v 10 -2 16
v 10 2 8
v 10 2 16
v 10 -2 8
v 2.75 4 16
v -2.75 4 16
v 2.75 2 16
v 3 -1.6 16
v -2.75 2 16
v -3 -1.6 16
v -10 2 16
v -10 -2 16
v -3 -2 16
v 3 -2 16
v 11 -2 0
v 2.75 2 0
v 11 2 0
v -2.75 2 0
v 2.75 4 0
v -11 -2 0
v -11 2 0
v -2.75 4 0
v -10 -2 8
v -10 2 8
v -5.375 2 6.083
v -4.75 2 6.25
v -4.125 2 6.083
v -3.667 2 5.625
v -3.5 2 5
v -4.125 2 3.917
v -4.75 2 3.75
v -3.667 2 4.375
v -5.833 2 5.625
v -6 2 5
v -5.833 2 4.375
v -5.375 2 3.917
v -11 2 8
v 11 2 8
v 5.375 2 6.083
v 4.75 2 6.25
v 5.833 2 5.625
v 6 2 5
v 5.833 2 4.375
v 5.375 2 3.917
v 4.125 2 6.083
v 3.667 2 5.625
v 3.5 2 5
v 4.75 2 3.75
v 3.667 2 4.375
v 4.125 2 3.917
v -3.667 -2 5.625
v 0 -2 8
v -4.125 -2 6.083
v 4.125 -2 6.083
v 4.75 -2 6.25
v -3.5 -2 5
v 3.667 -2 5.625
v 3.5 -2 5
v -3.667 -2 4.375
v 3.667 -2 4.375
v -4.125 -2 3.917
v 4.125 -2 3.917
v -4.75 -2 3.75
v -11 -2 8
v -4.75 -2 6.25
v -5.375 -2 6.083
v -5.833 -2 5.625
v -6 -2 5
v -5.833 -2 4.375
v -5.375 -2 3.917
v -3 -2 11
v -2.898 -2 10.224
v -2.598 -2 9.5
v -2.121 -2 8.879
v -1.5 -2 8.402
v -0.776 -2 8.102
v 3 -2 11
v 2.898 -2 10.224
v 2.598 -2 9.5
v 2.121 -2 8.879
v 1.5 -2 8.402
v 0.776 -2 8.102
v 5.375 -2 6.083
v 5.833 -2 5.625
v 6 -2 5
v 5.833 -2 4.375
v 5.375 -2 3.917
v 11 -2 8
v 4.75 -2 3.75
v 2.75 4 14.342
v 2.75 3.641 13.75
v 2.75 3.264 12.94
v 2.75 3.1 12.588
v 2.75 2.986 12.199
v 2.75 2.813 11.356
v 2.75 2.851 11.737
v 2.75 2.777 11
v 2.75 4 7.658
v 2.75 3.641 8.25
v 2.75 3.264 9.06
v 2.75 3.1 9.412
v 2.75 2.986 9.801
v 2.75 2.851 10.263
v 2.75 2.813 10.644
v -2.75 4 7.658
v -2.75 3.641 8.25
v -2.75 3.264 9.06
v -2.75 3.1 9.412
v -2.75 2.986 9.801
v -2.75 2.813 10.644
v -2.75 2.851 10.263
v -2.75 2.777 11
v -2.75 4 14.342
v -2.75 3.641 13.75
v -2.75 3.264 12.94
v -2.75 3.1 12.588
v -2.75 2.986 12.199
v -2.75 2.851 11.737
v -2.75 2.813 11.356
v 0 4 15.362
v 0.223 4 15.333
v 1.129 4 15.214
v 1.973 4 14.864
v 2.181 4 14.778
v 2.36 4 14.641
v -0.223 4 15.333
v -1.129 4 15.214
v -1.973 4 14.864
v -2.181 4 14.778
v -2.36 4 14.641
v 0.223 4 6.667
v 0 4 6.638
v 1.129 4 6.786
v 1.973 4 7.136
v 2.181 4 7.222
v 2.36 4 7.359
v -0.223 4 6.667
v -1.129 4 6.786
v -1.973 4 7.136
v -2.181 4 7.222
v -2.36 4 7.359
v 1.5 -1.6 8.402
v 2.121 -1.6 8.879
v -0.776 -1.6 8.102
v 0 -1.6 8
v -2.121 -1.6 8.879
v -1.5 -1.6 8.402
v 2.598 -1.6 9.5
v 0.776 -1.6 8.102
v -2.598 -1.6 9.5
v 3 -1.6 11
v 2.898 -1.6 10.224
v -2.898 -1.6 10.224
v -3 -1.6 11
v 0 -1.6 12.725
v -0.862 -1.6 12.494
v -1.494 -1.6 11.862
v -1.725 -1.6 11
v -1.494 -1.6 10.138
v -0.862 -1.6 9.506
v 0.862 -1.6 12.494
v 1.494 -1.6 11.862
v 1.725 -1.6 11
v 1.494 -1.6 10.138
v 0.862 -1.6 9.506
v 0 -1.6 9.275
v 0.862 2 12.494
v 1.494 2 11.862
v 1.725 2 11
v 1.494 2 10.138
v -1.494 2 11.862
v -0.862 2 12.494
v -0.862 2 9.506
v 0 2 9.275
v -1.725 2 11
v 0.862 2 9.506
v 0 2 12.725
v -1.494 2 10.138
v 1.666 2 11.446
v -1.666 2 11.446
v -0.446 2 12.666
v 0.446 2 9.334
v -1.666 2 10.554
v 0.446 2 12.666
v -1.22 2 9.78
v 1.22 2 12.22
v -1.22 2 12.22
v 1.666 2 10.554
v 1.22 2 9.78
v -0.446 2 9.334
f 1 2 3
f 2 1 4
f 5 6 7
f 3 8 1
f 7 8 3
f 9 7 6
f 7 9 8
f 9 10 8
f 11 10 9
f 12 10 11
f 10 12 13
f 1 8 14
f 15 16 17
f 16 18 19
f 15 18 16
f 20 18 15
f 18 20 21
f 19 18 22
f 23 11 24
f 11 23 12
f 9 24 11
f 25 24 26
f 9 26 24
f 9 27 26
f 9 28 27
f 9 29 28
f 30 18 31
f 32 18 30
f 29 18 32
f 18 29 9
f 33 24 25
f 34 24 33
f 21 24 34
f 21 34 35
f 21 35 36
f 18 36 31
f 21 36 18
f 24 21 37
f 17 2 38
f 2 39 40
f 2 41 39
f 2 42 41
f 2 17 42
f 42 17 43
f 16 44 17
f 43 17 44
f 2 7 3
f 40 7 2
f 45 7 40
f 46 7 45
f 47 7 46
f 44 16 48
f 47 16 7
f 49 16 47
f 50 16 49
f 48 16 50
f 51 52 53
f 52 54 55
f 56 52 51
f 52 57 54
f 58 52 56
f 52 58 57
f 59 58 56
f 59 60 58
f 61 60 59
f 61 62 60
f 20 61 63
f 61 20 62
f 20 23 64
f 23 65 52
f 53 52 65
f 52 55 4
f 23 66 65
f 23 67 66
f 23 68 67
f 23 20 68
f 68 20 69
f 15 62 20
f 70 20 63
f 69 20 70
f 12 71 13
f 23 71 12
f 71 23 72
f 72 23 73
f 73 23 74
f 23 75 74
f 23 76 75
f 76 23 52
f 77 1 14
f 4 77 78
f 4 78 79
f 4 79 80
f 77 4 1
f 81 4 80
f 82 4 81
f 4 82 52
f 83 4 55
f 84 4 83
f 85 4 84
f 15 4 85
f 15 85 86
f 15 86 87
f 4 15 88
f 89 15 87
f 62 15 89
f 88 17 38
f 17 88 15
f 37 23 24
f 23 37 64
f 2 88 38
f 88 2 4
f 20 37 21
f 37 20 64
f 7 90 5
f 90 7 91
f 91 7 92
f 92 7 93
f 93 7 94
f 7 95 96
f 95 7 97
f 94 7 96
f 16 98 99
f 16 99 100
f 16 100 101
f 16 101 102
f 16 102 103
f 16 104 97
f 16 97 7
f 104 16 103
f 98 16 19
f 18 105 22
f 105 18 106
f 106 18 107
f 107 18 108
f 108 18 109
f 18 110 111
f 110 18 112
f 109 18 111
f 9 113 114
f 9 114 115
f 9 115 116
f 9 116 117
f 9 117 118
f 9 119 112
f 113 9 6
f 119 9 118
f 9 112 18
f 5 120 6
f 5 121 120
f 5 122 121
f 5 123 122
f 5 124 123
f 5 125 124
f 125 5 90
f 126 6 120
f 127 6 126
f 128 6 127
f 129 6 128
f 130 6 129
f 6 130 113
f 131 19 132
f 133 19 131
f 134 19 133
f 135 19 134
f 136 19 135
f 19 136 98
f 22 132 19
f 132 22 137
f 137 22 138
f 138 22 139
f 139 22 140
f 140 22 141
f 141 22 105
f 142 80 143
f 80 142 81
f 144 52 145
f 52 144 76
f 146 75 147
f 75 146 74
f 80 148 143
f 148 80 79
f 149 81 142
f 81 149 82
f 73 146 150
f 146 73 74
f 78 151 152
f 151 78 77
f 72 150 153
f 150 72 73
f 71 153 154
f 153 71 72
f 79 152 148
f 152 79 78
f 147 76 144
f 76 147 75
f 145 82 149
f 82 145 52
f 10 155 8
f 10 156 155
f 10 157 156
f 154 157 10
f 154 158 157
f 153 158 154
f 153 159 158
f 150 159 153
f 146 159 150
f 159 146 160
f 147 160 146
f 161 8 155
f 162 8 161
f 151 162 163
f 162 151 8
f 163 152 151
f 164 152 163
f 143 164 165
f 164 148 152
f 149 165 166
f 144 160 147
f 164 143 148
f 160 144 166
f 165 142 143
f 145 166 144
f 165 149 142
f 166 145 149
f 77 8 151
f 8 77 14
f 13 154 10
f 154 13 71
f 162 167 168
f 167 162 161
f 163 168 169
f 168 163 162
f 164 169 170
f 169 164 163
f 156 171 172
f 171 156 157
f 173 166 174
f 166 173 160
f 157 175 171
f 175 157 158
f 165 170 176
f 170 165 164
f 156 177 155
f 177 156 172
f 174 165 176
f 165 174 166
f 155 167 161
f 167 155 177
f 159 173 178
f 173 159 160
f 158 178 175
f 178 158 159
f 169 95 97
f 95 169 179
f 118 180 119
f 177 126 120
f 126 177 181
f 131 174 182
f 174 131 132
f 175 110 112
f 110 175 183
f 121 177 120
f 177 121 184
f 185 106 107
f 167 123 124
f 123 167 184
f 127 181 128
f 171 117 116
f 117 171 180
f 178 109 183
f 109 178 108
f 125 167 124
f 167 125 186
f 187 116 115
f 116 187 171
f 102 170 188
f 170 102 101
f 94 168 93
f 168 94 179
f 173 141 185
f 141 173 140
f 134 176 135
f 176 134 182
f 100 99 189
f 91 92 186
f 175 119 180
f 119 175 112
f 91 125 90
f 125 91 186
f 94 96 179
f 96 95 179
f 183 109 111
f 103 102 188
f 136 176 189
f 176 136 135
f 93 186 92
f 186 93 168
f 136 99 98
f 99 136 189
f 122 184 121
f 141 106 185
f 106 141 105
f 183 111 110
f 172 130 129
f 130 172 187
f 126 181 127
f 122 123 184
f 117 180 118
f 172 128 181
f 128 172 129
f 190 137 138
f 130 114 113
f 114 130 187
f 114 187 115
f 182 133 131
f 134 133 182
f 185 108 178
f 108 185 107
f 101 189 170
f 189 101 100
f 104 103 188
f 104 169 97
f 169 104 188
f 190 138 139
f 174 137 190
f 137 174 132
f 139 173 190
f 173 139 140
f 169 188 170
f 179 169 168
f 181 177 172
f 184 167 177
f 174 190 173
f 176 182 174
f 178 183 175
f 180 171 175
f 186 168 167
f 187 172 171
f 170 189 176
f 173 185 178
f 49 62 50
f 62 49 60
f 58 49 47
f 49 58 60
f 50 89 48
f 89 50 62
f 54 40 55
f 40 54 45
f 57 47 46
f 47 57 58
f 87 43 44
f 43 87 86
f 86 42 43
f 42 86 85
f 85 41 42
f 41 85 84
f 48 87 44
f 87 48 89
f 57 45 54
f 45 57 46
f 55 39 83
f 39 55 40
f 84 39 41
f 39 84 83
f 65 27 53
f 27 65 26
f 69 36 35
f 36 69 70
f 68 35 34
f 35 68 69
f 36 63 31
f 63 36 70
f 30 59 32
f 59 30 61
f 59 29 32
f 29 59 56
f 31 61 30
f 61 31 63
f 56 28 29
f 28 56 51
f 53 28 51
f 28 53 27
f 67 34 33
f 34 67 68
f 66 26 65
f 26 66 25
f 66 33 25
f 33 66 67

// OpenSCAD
// file: microswitch.scad
// Don't print this file, purchase real micro switches
// e.g. Honeywell ZM10B10A01 or OMRON SS-5 or similar.

module microswitch() {
  difference() {
    union() {
      translate([0, 0, 2.5])
        cube([19.8, 6, 10], center=true);
      translate([2.5, 0.5, 6])
        cube([2, 3.5, 5], center=true);
      for (x = [-8, -1, 8]) {
        translate([x, 0, 0])
          cube([0.6, 3.2, 13], center=true);
      }
    }
    for (x = [-9.5/2, 9.5/2]) {
      translate([x, 0, 0]) rotate([90, 0, 0])
        cylinder(r=2.5/2, h=20, center=true, $fn=12);
    }
  }
}

microswitch();
// file: configuration.scad
// Increase this if your slicer or printer make holes too tight.
extra_radius = 0.1;

// OD = outside diameter, corner to corner.
m3_nut_od = 6.1;
m3_nut_radius = m3_nut_od/2 + 0.2 + extra_radius;
m3_washer_radius = 3.5 + extra_radius;


// OD = outside diameter, corner to corner.
m3_nut_od = 6.1;
m3_nut_radius = m3_nut_od/2 + 0.2 + extra_radius;
m3_washer_radius = 3.5 + extra_radius;


// Major diameter of metric 3mm thread.
m3_major = 2.85;
m3_radius = m3_major/2 + extra_radius;
m3_wide_radius = m3_major/2 + extra_radius + 0.2;

// NEMA17 stepper motors.
motor_shaft_diameter = 5;
motor_shaft_radius = motor_shaft_diameter/2 + extra_radius;

// Frame brackets. M3x8mm screws work best with 3.6 mm brackets.
thickness = 3.6;

// OpenBeam or Misumi. Currently only 15x15 mm, but there is a plan
// to make models more parametric and allow 20x20 mm in the future.
extrusion = 15;

// Placement for the NEMA17 stepper motors.
motor_offset = 44;
motor_length = 47;
// main file
include <configuration.scad>;

use <microswitch.scad>;

thickness = 4;  //  thicker than v-roller linear .
width = 20;  // Same as vertical extrusion.change  for 2020
height = 16;

module endstop() {
  difference() {
    union() {
      cube([width, thickness, height], center=true);
      translate([0, 0, -height/4])
        cube([width+2, thickness, height/2], center=true);
      translate([0, 2, 0])
        //change  for 2020  by bloomlj
        cube([5.5, thickness, height], center=true);
    }
    translate([0, 0, 3]) rotate([90, 0, 0]) {
      cylinder(r=m3_wide_radius, h=20, center=true, $fn=12);
      translate([0, 0, 3.6-thickness/2]) {
        cylinder(r=3, h=10, $fn=24);
        translate([0, 5, 5])
          cube([6, 10, 10], center=true);
      }
      translate([0, 0, -thickness/2]) scale([1, 1, -1])
        cylinder(r1=m3_wide_radius, r2=7, h=4, $fn=24);
    }
    translate([0, -3-thickness/2, -3]) rotate([0, 180, 0]) {
      % microswitch();
      for (x = [-9.5/2, 9.5/2]) {
        translate([x, 0, 0]) rotate([90, 0, 0])
          cylinder(r=2.5/2, h=40, center=true, $fn=12);
      }
    }
  }
}

translate([0, 0, height/2]) endstop();
